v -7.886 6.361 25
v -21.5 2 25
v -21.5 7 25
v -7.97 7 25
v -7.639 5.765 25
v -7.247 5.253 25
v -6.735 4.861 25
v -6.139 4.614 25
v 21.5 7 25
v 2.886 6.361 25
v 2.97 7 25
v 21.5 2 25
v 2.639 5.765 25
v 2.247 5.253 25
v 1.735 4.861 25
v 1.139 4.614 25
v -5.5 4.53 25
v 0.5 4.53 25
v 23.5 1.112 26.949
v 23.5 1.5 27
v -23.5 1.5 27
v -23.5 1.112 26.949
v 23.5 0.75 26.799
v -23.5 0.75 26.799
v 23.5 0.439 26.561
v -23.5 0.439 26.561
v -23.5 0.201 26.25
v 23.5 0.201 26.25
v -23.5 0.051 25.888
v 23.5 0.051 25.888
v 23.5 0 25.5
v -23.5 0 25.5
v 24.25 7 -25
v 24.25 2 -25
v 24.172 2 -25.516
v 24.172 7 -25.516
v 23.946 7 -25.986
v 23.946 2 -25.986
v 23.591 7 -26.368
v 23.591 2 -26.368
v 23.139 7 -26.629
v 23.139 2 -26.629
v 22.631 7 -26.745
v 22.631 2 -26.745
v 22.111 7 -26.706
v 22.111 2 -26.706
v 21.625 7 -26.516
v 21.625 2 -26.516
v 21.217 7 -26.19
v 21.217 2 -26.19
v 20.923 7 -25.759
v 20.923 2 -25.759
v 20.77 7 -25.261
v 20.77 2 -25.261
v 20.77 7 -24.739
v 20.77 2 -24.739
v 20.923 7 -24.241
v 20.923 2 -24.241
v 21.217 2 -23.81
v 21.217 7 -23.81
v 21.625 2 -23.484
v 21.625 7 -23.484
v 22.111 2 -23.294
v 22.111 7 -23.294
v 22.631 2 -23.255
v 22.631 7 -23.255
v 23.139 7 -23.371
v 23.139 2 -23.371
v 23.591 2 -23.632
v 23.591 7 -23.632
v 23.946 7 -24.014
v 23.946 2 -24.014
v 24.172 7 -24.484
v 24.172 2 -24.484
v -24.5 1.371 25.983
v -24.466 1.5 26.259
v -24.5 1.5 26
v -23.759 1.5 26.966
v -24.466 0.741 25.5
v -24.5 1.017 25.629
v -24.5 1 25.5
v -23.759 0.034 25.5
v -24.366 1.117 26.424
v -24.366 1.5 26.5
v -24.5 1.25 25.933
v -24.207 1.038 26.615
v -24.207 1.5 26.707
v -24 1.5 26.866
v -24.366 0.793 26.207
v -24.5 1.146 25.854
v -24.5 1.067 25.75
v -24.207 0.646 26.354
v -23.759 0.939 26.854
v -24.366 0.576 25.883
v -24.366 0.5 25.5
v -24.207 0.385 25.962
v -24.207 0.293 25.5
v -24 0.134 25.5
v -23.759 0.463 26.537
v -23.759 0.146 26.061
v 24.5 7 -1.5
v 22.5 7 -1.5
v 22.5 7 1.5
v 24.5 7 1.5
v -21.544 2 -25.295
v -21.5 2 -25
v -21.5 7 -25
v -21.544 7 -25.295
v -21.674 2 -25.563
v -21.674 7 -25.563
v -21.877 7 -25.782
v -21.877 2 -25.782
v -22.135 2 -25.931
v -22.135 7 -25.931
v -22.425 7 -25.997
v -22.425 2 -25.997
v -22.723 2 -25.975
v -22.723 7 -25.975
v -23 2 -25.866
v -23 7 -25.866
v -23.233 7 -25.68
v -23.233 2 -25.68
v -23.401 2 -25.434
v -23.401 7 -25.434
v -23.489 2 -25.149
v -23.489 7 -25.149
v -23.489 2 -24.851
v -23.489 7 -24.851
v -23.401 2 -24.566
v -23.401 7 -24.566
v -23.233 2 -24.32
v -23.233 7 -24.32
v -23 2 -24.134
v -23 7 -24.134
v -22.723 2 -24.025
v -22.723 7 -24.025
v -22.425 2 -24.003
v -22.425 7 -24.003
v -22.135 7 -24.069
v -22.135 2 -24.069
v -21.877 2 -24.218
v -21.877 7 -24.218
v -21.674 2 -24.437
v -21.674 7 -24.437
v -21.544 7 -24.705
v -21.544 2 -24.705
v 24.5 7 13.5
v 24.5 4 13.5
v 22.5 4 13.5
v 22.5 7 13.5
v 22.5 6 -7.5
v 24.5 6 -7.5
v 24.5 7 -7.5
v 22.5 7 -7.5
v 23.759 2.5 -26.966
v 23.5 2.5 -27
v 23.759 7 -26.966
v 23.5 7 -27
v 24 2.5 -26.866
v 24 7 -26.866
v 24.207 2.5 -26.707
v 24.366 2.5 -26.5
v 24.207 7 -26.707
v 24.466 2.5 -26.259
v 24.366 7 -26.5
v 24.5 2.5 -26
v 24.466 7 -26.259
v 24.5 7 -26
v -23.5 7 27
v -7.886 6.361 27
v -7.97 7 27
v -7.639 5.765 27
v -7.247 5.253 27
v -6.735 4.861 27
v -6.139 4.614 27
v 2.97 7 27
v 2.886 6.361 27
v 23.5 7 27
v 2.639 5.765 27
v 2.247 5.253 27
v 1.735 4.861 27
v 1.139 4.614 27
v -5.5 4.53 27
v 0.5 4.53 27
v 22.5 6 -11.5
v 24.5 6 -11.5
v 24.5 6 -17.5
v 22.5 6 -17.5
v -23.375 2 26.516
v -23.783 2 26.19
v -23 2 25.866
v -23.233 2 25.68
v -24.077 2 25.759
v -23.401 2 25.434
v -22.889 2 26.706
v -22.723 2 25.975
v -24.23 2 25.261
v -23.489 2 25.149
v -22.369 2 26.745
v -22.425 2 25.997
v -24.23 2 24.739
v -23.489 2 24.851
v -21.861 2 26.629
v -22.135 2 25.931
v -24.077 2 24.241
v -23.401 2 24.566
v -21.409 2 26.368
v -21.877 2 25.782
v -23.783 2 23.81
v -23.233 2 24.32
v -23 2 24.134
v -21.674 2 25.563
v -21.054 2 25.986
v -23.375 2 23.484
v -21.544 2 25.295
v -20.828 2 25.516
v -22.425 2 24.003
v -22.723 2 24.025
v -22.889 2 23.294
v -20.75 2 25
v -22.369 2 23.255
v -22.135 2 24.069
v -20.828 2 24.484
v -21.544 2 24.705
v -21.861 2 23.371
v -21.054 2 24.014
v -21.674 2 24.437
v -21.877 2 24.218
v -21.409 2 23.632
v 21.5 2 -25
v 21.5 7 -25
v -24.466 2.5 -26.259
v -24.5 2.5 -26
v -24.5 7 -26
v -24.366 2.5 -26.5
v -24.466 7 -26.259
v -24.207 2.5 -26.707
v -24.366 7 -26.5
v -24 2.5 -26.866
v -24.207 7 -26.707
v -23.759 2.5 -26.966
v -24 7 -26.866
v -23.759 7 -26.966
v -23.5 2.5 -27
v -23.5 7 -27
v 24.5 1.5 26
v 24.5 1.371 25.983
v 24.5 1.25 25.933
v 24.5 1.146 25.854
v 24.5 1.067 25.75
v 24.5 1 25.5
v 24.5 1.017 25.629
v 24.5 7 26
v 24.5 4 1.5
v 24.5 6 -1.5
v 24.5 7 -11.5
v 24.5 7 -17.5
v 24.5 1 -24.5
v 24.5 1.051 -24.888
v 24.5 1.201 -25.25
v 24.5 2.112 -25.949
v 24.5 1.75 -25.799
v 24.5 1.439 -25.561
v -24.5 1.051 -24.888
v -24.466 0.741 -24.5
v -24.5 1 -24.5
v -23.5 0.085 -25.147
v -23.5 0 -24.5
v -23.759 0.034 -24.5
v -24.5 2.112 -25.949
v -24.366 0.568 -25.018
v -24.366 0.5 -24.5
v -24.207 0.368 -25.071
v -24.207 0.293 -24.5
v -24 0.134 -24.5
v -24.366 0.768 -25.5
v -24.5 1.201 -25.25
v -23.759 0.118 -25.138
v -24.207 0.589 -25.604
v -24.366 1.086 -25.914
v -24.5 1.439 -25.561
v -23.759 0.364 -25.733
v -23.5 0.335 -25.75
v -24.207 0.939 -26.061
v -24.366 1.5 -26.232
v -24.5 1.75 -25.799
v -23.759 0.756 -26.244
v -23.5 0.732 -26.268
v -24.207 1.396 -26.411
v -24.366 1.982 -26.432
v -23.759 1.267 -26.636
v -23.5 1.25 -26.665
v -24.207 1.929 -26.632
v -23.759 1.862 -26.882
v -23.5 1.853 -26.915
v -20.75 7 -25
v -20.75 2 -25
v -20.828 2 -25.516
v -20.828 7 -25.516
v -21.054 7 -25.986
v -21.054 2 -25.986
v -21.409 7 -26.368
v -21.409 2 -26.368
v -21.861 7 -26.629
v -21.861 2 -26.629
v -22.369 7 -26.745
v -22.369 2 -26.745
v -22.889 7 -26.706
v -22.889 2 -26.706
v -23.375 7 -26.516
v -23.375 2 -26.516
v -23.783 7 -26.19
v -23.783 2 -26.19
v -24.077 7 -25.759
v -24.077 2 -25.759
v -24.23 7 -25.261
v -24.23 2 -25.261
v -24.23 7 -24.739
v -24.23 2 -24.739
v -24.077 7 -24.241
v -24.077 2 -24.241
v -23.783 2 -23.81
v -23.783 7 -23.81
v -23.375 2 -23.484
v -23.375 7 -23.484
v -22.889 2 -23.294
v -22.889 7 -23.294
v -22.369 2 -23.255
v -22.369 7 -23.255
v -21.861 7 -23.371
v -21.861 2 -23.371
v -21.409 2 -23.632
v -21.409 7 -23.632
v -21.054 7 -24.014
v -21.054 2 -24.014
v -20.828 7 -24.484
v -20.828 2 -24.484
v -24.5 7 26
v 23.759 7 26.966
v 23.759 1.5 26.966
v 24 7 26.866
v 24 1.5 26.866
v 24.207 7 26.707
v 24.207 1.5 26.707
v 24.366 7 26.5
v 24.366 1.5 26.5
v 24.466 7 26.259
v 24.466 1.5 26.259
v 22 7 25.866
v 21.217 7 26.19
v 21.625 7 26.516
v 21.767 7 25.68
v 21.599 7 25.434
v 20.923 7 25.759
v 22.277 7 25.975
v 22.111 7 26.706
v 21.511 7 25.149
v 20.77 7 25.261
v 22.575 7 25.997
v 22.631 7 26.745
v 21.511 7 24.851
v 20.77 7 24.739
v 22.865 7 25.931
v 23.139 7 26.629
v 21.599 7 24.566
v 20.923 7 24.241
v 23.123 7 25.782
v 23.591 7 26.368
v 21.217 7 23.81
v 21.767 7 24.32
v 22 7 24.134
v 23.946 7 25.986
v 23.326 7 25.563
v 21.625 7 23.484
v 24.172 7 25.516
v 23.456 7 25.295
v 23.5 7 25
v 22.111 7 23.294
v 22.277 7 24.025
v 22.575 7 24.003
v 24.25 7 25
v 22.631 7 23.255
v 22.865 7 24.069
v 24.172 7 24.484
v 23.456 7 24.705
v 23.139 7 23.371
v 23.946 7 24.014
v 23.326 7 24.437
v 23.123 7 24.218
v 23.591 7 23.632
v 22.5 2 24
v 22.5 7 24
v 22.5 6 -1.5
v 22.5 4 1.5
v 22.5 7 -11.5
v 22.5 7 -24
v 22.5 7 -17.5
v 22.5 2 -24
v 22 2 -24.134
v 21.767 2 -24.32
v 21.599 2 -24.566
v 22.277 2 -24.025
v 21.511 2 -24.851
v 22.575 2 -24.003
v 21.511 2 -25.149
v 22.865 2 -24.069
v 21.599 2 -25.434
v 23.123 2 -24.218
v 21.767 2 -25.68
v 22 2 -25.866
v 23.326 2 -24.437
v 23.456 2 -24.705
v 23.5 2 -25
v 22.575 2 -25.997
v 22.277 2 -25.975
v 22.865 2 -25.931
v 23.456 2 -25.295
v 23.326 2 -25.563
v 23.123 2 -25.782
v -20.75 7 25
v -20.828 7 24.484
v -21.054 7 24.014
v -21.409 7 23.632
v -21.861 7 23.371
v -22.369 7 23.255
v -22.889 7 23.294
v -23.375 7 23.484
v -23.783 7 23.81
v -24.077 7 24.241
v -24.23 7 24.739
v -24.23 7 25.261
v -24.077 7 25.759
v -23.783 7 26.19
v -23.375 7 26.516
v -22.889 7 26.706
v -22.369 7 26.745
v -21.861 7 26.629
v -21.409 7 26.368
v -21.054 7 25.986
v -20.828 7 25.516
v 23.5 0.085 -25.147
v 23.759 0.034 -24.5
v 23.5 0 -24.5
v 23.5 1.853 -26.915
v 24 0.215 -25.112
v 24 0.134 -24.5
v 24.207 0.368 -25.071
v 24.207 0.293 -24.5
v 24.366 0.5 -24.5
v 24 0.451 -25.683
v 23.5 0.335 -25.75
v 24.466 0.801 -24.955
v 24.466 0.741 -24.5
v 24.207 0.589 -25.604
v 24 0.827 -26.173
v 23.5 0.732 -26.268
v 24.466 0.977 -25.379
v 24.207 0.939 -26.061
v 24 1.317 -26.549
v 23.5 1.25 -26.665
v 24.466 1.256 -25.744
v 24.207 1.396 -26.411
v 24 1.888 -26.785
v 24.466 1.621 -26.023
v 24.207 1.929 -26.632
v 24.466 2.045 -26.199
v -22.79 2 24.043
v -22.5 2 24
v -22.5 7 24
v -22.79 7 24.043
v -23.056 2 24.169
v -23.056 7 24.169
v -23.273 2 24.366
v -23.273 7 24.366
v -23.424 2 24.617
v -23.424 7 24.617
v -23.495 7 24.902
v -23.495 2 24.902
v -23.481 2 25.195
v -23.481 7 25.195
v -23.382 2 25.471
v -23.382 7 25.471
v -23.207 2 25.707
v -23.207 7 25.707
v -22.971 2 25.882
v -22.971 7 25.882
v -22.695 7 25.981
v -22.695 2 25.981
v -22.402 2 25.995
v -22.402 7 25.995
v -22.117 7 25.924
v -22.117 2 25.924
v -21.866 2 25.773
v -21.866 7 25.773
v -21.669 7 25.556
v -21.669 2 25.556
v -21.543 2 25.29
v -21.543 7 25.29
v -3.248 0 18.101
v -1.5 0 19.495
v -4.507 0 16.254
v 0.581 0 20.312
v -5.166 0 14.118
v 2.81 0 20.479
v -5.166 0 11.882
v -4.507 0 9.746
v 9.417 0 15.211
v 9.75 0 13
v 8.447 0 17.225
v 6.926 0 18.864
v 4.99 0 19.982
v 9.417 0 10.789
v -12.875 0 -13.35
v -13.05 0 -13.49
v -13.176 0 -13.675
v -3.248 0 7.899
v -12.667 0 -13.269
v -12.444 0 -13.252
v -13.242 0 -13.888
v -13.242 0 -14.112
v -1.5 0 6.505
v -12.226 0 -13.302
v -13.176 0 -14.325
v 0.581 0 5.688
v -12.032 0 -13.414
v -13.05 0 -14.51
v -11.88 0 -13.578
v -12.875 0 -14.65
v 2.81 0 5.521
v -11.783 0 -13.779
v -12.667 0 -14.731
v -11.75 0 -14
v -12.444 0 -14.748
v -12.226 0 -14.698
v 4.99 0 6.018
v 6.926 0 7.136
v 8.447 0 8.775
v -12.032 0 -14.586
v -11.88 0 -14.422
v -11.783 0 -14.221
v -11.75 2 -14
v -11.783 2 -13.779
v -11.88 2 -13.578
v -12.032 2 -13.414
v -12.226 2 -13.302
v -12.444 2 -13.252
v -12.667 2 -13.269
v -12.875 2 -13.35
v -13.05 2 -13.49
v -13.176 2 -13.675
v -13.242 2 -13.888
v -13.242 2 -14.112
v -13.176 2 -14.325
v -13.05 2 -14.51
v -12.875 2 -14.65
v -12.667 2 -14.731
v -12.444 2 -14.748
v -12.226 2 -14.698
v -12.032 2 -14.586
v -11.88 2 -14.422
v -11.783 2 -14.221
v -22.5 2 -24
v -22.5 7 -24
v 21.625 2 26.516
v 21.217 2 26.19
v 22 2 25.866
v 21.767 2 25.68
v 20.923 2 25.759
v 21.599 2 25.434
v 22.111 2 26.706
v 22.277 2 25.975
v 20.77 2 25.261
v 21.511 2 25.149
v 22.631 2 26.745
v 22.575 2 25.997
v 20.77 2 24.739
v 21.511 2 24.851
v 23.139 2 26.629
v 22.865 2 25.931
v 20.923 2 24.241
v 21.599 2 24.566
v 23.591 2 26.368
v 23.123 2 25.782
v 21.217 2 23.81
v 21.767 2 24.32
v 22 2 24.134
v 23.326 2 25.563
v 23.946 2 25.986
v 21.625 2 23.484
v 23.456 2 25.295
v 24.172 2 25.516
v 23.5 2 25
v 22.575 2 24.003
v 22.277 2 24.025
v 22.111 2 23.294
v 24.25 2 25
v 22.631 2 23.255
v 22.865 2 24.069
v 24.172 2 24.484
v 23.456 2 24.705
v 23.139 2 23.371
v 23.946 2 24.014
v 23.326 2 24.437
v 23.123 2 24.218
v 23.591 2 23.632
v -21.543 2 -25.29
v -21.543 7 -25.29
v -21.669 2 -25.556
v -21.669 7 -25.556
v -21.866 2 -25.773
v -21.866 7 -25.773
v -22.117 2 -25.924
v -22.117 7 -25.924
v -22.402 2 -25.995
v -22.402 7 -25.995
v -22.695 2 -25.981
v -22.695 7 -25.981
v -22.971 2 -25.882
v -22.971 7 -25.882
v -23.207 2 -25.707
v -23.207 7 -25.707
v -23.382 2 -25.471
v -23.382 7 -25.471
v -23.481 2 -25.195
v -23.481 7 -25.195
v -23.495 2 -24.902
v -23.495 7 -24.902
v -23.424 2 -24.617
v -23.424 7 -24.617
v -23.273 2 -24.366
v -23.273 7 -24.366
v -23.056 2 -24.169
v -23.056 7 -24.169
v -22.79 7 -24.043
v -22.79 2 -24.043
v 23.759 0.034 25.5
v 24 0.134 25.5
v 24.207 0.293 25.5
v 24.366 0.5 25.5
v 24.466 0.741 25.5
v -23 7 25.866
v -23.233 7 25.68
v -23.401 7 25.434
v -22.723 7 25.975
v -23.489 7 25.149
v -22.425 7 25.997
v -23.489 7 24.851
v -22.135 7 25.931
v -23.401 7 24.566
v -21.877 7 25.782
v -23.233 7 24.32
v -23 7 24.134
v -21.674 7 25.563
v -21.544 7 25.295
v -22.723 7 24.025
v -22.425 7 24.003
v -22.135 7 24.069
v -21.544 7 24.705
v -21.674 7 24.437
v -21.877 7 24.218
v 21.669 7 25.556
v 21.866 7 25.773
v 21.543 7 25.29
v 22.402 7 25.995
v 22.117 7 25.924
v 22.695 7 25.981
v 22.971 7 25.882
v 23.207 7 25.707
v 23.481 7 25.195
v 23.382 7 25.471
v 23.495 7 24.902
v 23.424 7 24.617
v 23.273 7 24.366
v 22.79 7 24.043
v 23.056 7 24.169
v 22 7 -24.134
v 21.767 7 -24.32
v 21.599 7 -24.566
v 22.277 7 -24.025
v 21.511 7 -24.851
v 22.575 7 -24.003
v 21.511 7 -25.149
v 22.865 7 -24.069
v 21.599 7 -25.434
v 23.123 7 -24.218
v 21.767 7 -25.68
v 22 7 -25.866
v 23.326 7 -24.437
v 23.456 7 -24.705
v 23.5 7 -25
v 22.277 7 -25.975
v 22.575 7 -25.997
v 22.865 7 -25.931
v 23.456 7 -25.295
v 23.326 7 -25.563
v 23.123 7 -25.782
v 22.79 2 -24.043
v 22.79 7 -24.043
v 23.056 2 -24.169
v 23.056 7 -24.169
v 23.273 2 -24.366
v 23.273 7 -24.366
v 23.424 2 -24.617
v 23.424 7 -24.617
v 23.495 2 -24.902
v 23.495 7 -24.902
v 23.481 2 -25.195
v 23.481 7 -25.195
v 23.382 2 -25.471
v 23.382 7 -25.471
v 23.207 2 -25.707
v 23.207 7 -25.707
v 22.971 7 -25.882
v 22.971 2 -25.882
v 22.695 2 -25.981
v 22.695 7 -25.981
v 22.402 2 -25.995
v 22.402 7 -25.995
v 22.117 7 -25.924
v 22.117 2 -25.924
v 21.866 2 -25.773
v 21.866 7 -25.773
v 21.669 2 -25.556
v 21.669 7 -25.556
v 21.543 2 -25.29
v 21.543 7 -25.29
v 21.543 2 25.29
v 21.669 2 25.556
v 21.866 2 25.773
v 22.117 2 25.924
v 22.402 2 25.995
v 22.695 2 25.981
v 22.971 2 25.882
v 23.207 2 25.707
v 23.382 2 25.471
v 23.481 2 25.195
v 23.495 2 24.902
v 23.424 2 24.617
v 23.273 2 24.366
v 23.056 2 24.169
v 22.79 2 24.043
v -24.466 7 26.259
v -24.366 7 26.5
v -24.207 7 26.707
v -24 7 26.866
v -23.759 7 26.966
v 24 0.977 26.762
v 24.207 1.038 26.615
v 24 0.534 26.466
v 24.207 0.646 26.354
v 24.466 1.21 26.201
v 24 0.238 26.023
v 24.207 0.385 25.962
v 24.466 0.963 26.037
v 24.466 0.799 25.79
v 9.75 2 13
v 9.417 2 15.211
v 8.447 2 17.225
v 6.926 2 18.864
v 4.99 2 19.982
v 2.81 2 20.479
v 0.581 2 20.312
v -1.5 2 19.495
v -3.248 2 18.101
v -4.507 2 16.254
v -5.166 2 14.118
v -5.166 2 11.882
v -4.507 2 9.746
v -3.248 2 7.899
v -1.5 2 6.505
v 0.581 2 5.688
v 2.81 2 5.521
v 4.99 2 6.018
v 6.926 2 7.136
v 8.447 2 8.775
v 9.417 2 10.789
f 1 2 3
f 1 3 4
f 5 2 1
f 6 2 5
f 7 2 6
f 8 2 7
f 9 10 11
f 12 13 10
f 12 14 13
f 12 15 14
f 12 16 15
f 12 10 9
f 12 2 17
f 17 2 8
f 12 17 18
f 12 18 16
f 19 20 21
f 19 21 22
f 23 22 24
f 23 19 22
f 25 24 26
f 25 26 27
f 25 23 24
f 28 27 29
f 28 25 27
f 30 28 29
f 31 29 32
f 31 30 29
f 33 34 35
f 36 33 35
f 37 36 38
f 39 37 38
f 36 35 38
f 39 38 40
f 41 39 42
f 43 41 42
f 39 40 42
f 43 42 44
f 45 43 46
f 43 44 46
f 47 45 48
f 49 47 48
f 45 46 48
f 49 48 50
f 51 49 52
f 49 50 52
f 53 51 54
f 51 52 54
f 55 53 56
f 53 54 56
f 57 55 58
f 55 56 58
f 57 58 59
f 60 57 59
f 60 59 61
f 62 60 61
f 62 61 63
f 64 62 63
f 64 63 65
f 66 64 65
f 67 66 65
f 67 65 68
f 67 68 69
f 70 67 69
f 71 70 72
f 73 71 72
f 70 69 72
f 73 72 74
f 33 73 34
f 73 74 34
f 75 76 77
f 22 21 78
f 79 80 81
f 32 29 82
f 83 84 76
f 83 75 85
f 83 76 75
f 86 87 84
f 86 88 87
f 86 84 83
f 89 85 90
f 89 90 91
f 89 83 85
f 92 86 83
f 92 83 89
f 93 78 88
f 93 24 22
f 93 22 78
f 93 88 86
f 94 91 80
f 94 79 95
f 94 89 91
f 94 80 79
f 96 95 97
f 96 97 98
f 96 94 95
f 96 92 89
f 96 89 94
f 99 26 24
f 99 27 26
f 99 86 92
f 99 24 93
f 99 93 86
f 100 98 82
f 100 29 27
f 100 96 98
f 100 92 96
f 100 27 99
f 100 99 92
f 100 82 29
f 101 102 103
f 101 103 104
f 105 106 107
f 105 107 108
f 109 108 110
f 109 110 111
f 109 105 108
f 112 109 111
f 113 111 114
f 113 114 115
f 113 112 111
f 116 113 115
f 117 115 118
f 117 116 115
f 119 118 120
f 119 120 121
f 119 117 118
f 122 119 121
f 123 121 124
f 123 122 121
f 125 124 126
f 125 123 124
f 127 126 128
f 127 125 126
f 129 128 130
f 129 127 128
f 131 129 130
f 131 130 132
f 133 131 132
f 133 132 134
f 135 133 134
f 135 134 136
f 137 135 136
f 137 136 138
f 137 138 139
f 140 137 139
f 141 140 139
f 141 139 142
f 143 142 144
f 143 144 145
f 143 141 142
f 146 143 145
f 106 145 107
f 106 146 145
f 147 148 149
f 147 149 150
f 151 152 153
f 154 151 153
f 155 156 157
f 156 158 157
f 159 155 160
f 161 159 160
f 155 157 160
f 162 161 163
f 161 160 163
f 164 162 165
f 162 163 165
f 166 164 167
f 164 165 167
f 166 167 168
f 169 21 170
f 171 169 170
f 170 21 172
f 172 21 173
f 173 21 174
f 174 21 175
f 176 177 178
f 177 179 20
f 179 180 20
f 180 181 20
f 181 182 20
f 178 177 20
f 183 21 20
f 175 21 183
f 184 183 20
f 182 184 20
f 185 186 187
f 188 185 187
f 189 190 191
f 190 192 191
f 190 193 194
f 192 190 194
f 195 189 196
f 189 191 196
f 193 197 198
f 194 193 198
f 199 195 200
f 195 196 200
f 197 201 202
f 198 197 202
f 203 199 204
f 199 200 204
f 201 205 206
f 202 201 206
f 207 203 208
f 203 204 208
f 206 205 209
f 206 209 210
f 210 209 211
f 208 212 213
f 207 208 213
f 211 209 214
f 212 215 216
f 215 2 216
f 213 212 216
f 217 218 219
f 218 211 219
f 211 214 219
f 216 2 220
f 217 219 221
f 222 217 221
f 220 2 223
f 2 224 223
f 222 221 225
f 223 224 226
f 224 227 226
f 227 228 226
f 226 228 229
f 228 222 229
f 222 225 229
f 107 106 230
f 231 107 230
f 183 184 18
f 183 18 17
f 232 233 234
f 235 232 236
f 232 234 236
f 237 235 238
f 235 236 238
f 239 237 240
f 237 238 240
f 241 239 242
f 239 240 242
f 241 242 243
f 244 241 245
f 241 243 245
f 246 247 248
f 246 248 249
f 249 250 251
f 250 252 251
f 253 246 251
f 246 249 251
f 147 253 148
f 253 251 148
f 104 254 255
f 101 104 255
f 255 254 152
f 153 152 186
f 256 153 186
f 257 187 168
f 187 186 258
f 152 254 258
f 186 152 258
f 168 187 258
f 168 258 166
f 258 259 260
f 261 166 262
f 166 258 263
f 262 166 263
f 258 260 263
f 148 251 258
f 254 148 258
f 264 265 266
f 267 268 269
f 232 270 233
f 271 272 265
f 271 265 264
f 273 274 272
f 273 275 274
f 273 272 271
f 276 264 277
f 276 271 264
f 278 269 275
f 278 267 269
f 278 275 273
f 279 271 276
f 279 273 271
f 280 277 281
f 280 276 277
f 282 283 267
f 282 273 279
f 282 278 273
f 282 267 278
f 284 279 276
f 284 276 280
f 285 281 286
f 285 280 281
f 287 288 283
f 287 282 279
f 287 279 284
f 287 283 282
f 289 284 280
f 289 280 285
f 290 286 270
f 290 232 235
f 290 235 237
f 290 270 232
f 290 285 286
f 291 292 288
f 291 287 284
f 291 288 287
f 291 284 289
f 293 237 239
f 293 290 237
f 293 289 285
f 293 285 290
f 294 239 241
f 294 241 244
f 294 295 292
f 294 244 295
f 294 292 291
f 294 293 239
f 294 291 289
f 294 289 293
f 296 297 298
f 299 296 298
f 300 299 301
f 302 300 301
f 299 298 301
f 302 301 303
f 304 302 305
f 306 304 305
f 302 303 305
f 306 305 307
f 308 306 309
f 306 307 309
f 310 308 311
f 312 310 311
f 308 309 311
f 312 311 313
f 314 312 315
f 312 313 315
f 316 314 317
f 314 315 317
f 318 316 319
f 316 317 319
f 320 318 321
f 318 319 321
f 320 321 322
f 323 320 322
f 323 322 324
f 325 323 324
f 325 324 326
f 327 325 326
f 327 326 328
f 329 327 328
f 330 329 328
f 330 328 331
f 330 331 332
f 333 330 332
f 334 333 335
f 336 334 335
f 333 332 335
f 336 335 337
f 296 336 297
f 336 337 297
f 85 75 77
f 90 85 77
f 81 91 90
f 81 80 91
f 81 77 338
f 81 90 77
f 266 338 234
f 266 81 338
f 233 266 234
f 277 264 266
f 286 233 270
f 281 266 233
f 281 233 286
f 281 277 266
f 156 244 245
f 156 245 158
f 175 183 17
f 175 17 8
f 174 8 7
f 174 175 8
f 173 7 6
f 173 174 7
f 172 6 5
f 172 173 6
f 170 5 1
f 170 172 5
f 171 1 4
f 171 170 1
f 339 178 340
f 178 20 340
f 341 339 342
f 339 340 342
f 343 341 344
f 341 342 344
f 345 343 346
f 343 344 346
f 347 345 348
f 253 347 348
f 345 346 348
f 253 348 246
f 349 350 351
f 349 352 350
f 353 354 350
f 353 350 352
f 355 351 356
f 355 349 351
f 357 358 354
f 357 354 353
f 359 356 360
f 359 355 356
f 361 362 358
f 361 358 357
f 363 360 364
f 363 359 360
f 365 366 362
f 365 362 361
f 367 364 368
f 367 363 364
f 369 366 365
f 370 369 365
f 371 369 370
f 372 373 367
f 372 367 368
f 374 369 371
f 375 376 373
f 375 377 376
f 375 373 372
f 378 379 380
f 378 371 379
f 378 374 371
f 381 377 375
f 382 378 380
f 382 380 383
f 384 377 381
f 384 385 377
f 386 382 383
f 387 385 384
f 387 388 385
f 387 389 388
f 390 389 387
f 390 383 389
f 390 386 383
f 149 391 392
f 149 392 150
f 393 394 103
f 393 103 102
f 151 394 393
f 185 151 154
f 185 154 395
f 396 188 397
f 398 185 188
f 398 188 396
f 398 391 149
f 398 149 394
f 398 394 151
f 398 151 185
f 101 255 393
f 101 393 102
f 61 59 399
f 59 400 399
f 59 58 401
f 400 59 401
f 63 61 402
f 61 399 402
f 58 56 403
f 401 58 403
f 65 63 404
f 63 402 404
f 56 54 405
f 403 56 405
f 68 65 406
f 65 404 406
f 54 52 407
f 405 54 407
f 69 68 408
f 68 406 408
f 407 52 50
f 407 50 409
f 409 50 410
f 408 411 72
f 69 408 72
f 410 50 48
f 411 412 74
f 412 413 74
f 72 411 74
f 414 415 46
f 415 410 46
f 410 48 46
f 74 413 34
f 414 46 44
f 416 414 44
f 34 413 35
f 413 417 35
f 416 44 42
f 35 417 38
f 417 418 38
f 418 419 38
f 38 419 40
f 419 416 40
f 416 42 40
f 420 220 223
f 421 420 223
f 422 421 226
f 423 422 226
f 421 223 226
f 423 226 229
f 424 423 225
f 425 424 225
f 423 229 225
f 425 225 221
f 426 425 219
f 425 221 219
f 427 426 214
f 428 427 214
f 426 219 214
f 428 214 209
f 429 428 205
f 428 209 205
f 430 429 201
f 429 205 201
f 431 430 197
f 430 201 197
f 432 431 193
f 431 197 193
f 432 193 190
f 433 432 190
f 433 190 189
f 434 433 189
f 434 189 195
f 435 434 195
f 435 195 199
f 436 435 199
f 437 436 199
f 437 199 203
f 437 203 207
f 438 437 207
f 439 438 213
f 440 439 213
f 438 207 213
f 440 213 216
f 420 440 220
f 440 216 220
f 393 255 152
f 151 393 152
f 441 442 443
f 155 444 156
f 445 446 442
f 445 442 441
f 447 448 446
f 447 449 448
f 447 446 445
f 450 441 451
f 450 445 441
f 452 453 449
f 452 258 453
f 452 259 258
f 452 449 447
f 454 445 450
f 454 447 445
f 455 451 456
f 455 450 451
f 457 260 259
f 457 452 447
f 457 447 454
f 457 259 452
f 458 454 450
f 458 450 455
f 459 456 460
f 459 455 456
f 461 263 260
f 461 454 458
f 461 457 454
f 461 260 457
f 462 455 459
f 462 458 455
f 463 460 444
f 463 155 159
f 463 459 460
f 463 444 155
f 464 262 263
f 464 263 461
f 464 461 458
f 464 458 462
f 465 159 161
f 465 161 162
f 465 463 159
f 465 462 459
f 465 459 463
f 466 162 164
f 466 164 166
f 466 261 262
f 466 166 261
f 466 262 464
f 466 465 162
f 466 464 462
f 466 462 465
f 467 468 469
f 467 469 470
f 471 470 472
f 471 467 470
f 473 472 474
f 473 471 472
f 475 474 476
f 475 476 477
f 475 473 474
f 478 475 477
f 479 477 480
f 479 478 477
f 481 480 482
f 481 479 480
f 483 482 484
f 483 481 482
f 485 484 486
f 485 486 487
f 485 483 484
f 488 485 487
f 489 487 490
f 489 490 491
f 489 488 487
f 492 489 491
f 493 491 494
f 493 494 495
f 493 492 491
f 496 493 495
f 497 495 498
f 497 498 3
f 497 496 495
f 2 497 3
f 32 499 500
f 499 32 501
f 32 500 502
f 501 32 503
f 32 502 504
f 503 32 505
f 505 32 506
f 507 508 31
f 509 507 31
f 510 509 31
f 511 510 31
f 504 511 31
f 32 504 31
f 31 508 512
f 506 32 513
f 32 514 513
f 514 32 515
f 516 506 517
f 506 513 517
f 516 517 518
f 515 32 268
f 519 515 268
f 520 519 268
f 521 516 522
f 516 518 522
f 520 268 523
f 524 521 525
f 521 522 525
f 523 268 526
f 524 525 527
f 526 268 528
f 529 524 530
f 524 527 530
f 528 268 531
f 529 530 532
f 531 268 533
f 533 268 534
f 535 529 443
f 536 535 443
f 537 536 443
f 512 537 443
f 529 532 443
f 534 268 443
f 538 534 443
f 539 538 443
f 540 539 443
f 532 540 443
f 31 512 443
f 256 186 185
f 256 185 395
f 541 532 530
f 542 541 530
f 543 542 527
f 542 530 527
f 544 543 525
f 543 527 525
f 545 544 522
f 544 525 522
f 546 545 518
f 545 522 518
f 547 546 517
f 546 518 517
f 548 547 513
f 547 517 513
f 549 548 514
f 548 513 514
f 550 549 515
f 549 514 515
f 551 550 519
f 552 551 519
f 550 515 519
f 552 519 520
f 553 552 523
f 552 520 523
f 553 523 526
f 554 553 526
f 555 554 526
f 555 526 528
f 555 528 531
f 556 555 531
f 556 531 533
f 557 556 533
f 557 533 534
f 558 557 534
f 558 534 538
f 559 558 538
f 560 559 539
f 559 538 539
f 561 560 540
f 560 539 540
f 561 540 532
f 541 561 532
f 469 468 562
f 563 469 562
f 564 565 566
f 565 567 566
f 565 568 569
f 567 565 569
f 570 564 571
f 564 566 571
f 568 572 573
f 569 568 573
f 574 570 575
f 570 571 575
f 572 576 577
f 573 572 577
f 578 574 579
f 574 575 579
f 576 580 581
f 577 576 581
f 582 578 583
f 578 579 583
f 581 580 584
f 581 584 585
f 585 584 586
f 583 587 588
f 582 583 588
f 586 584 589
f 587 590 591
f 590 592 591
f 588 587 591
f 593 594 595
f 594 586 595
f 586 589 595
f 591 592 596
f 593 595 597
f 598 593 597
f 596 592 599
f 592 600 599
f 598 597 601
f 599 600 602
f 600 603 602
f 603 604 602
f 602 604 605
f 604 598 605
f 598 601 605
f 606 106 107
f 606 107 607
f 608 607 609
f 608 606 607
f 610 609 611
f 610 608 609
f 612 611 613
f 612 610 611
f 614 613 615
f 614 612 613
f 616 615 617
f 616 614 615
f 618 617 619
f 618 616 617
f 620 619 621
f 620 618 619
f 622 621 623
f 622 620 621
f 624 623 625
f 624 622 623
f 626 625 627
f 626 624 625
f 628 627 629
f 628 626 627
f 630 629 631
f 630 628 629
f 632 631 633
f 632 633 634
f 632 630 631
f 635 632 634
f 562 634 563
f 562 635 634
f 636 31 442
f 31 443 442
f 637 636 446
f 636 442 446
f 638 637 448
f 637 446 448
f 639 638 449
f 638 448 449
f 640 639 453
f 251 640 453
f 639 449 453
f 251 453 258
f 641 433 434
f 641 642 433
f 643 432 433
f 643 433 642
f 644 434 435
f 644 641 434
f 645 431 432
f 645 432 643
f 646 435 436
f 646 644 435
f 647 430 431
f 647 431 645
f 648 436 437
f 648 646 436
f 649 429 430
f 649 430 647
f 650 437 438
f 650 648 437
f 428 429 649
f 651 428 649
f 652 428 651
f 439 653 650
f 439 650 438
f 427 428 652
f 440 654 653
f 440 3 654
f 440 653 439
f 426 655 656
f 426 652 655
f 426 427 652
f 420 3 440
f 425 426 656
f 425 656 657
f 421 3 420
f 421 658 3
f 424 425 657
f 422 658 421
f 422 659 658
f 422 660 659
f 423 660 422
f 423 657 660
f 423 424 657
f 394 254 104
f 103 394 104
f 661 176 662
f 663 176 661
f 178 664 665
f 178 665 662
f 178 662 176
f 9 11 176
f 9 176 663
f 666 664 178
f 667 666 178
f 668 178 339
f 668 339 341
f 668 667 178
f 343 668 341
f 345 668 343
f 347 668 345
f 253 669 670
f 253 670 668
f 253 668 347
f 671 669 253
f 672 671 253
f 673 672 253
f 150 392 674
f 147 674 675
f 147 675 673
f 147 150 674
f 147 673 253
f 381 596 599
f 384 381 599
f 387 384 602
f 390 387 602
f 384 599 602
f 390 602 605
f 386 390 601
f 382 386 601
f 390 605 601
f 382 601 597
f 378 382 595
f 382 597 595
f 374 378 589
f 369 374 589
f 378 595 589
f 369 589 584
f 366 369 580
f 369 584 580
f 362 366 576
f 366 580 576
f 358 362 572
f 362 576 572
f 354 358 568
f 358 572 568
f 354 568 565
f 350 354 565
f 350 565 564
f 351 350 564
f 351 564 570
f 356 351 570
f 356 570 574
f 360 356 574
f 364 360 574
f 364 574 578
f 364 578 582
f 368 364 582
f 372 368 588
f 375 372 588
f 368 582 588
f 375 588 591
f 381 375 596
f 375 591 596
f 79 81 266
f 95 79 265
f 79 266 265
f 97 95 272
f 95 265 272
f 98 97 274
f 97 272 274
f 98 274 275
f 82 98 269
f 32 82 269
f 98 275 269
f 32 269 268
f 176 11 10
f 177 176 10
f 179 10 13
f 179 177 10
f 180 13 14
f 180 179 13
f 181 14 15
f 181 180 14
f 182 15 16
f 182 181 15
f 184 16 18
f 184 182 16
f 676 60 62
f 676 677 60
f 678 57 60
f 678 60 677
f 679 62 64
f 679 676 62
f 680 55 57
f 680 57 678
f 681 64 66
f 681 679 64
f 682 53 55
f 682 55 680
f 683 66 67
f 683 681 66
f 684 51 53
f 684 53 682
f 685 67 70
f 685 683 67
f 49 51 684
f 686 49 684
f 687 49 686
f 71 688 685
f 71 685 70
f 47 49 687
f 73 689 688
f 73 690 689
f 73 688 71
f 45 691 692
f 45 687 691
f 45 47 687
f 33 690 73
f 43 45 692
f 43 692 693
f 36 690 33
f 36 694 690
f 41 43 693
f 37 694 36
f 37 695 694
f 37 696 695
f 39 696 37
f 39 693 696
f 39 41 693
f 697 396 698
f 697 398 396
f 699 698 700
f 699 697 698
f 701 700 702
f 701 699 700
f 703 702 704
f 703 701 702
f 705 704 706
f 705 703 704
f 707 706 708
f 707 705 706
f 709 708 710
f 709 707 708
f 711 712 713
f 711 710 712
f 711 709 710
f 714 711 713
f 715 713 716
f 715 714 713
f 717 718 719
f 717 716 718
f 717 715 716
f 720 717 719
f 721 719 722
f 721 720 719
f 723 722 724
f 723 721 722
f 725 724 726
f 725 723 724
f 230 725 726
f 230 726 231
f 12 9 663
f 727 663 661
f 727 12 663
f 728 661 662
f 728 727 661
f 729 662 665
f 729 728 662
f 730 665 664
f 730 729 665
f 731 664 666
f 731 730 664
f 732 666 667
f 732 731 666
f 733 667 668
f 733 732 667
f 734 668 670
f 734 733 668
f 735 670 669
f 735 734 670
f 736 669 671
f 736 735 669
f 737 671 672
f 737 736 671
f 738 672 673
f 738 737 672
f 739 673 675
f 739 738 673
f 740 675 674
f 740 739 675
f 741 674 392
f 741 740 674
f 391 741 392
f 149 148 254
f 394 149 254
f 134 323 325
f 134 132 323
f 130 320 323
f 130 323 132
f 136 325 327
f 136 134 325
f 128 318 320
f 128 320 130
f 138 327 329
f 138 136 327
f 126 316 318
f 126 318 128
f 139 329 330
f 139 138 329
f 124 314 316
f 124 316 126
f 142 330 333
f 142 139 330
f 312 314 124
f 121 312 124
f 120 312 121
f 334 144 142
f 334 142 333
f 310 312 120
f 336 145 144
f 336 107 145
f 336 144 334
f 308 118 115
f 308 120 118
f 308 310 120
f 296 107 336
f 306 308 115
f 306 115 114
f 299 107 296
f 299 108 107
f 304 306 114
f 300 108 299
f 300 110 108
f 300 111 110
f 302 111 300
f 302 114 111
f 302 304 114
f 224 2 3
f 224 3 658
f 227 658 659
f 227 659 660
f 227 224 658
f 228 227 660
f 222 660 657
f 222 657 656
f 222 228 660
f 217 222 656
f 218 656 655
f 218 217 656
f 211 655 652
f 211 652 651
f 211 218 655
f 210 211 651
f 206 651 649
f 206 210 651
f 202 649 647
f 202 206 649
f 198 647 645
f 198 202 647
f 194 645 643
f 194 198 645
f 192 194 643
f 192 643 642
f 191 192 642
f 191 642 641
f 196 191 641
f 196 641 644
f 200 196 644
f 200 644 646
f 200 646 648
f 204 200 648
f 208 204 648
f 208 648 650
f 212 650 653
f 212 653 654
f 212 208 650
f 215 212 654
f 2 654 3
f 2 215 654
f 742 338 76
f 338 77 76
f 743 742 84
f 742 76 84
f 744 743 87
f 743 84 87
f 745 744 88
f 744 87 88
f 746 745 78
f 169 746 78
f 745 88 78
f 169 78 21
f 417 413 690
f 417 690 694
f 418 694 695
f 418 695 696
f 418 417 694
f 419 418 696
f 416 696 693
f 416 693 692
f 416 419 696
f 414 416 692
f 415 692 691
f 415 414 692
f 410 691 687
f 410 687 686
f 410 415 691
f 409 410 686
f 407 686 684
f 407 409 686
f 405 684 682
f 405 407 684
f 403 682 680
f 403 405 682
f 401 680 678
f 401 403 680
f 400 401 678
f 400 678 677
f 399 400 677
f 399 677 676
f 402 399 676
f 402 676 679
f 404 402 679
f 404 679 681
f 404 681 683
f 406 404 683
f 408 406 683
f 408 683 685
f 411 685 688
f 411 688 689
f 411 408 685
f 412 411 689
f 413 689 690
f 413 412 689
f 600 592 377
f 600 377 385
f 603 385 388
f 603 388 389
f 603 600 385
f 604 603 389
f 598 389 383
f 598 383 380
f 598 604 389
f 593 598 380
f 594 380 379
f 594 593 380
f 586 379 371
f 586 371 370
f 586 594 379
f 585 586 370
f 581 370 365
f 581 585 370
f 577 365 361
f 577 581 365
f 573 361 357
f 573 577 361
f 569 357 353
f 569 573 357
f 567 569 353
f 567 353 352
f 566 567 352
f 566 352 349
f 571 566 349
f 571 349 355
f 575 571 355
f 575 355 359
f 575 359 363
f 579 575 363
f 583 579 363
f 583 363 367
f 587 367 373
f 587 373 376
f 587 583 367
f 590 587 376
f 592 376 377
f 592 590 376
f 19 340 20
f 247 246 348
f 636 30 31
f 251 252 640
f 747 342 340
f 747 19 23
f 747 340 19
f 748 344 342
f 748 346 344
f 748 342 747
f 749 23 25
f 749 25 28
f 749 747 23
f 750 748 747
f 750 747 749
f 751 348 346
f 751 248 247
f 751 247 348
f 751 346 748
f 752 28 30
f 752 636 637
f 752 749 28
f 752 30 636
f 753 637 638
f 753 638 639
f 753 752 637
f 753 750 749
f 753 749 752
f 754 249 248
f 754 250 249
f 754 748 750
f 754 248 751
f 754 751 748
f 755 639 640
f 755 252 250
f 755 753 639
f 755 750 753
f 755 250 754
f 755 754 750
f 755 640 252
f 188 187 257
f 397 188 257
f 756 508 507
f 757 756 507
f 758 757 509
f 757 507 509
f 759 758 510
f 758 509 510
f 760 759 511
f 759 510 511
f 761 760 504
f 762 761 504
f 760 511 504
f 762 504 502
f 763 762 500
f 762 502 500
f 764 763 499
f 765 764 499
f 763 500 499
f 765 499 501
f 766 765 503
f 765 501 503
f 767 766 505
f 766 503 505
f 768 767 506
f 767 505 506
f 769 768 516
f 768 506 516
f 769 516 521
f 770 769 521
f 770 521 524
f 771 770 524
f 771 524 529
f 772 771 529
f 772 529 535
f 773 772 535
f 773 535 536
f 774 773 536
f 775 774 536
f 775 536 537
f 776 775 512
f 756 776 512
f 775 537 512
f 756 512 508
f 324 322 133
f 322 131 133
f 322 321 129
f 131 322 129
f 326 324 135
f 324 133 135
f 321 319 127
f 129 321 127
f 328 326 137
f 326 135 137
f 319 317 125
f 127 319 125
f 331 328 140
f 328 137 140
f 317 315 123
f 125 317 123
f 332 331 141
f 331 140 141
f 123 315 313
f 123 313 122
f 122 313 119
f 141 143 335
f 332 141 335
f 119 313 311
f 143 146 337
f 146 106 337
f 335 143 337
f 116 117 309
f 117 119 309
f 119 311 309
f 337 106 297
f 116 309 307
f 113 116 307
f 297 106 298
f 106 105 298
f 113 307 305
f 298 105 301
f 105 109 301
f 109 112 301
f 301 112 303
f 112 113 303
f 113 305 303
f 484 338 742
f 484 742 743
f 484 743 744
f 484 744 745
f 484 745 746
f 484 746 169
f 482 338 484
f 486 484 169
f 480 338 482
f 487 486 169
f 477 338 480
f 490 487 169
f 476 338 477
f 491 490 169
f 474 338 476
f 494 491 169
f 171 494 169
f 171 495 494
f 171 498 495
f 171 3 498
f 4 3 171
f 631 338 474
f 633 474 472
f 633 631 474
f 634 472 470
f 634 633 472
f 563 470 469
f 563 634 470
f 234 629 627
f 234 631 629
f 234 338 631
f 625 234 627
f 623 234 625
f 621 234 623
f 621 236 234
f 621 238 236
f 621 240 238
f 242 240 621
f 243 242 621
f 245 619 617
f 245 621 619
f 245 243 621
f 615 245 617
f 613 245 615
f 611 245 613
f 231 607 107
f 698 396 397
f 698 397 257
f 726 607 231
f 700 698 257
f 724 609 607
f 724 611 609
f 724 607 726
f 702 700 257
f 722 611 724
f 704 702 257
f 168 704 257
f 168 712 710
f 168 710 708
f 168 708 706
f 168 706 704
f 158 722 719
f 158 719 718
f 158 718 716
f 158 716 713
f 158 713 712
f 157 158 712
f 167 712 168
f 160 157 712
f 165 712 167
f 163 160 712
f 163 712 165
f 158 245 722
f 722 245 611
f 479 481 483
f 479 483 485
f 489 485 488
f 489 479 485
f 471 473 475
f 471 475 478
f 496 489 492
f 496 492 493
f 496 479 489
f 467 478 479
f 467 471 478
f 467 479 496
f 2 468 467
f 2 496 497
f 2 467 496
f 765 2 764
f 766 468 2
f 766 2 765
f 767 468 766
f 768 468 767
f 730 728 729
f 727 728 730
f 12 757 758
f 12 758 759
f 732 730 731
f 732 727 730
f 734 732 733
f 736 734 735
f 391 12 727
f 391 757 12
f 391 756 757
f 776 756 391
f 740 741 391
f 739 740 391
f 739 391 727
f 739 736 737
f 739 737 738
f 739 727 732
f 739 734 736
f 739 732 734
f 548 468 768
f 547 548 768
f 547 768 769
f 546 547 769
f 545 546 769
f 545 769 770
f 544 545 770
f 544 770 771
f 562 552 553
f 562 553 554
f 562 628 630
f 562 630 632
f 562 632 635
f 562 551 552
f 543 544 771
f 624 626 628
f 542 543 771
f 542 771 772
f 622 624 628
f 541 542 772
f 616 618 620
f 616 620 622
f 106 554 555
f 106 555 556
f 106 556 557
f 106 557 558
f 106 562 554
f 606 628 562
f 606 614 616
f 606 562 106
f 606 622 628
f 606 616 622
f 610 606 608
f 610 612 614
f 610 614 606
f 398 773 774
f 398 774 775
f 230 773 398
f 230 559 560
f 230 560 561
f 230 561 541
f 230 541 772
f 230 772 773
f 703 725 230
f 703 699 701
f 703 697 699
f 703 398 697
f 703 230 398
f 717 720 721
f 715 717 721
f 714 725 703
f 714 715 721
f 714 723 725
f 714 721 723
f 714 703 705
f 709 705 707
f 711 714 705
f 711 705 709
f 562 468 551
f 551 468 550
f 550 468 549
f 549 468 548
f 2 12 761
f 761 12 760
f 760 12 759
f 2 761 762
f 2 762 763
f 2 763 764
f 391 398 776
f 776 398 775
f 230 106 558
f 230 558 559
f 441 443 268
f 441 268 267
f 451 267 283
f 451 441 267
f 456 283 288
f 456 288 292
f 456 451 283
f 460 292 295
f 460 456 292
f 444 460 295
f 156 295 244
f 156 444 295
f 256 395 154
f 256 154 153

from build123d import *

# Parameters (mm, degrees)
SKETCH1_W             = 49
SKETCH1_H             = 54
BOSS_EXTRUDE1_DEPTH   = 2
SKETCH2_W             = 49
SKETCH2_H             = 54
SKETCH2_W_2           = 45
SKETCH2_H_2           = 50
EXTRUDE_THIN1_DEPTH   = 5
SKETCH3_W             = 12
SKETCH3_H             = 3
CUT_EXTRUDE4_DEPTH    = 2
SKETCH10_W            = 6
SKETCH10_H            = 1
CUT_EXTRUDE5_DEPTH    = 2
SKETCH11_W            = 6
SKETCH11_H            = 1
CUT_EXTRUDE6_DEPTH    = 2
SKETCH16_R            = 7.5
CUT_EXTRUDE7_DEPTH    = 2
CUT_EXTRUDE8_DEPTH    = 2
SKETCH24_R            = 0.75
CUT_EXTRUDE9_DEPTH    = 2
SKETCH26_R            = 1.75
BOSS_EXTRUDE2_DEPTH   = 5
BOSS_EXTRUDE2_2_DEPTH = 5
BOSS_EXTRUDE2_3_DEPTH = 5
BOSS_EXTRUDE2_4_DEPTH = 5
SKETCH27_R            = 1
CUT_EXTRUDE10_DEPTH   = 5
FILLET3_R             = 1.5
FILLET4_R             = 2.5
FILLET5_R             = 1


with BuildPart() as part:
    # Sketch1 → Boss-Extrude1 (new body)
    with BuildSketch(Plane(origin=(0, 0, 0), x_dir=(1, 0, 0), z_dir=(0, 1, 0))):
        Rectangle(SKETCH1_W, SKETCH1_H)
    extrude(amount=BOSS_EXTRUDE1_DEPTH)

    # Sketch2 → Extrude-Thin1 (add)
    with BuildSketch(Plane(origin=(0, 2, 0), x_dir=(1, 0, 0), z_dir=(0, 1, 0))):
        Rectangle(SKETCH2_W, SKETCH2_H)
        Rectangle(SKETCH2_W_2, SKETCH2_H_2, mode=Mode.SUBTRACT)
    extrude(amount=EXTRUDE_THIN1_DEPTH)

    # Sketch3 → Cut-Extrude4 (cut)
    with BuildSketch(Plane(origin=(24.5, 0, 0), x_dir=(0, 0, -1), z_dir=(1, 0, 0))):
        with Locations((-7.5, 5.5)):
            Rectangle(SKETCH3_W, SKETCH3_H)
    extrude(amount=-CUT_EXTRUDE4_DEPTH, mode=Mode.SUBTRACT)

    # Sketch10 → Cut-Extrude5 (cut)
    with BuildSketch(Plane(origin=(24.5, 0, 0), x_dir=(0, 0, -1), z_dir=(1, 0, 0))):
        with Locations((4.5, 6.5)):
            Rectangle(SKETCH10_W, SKETCH10_H)
    extrude(amount=-CUT_EXTRUDE5_DEPTH, mode=Mode.SUBTRACT)

    # Sketch11 → Cut-Extrude6 (cut)
    with BuildSketch(Plane(origin=(24.5, 0, 0), x_dir=(0, 0, -1), z_dir=(1, 0, 0))):
        with Locations((14.5, 6.5)):
            Rectangle(SKETCH11_W, SKETCH11_H)
    extrude(amount=-CUT_EXTRUDE6_DEPTH, mode=Mode.SUBTRACT)

    # Sketch16 → Cut-Extrude7 (cut)
    with BuildSketch(Plane.XZ):
        with Locations((2.25, 13)):
            Circle(SKETCH16_R)
    extrude(amount=-CUT_EXTRUDE7_DEPTH, mode=Mode.SUBTRACT)

    # Sketch22 → Cut-Extrude8 (cut)
    with BuildSketch(Plane.XY.offset(27)):
        with BuildLine():
            Line((0.5, 4.529666561), (-5.5, 4.529666561))
            ThreePointArc((-5.5, 4.529666561), (-7.970333439, 7), (-5.5, 9.470333439))
            Line((-5.5, 9.470333439), (0.5, 9.470333439))
            ThreePointArc((0.5, 9.470333439), (2.970333439, 7), (0.5, 4.529666561))
        make_face()
    extrude(amount=-CUT_EXTRUDE8_DEPTH, mode=Mode.SUBTRACT)

    # Sketch24 → Cut-Extrude9 (cut)
    with BuildSketch(Plane.XZ):
        with Locations((-12.5, -14)):
            Circle(SKETCH24_R)
    extrude(amount=-CUT_EXTRUDE9_DEPTH, mode=Mode.SUBTRACT)


with BuildPart() as body_2:
    # Sketch26 → Boss-Extrude2 (new body)
    with BuildSketch(Plane(origin=(0, 2, 0), x_dir=(1, 0, 0), z_dir=(0, 1, 0))):
        with Locations((-22.5, 25)):
            Circle(SKETCH26_R)
    extrude(amount=BOSS_EXTRUDE2_DEPTH)


with BuildPart() as body_3:
    # Sketch26 → Boss-Extrude2 2 (new body)
    with BuildSketch(Plane(origin=(0, 2, 0), x_dir=(1, 0, 0), z_dir=(0, 1, 0))):
        with Locations((22.5, 25)):
            Circle(SKETCH26_R)
    extrude(amount=BOSS_EXTRUDE2_2_DEPTH)


with BuildPart() as body_4:
    # Sketch26 → Boss-Extrude2 3 (new body)
    with BuildSketch(Plane(origin=(0, 2, 0), x_dir=(1, 0, 0), z_dir=(0, 1, 0))):
        with Locations((22.5, -25)):
            Circle(SKETCH26_R)
    extrude(amount=BOSS_EXTRUDE2_3_DEPTH)


with BuildPart() as body_5:
    # Sketch26 → Boss-Extrude2 4 (new body)
    with BuildSketch(Plane(origin=(0, 2, 0), x_dir=(1, 0, 0), z_dir=(0, 1, 0))):
        with Locations((-22.5, -25)):
            Circle(SKETCH26_R)
    extrude(amount=BOSS_EXTRUDE2_4_DEPTH)


with BuildPart() as cut_extrude10_tool:
    # Sketch27 → Cut-Extrude10 (new body)
    with BuildSketch(Plane(origin=(0, 2, 0), x_dir=(1, 0, 0), z_dir=(0, 1, 0))):
        with Locations((-22.5, 25)):
            Circle(SKETCH27_R)
        with Locations((22.5, 25)):
            Circle(SKETCH27_R)
        with Locations((22.5, -25)):
            Circle(SKETCH27_R)
        with Locations((-22.5, -25)):
            Circle(SKETCH27_R)
    extrude(amount=CUT_EXTRUDE10_DEPTH)


with BuildPart() as part_1:
    add(part.part)

    # Cut-Extrude10: cut by cut_extrude10_tool
    add(cut_extrude10_tool.part, mode=Mode.SUBTRACT)

    # Fillet3
    fillet3_edges = [part_1.edges().sort_by_distance(p)[0] for p in [
        (0, 0, 27),
    ]]
    fillet(fillet3_edges, radius=FILLET3_R)

    # Fillet4
    fillet4_edges = [part_1.edges().sort_by_distance(p)[0] for p in [
        (0, 0, -27),
    ]]
    fillet(fillet4_edges, radius=FILLET4_R)

    # Fillet5
    fillet5_edges = [part_1.edges().sort_by_distance(p)[0] for p in [
        (24.5, 0, 0.5),
        (24.5, 0.439339828, 26.560660172),
        (-24.5, 0.439339828, 26.560660172),
        (-24.5, 0, 0.5),
        (-24.5, 0.732233047, -26.267766953),
        (24.5, 0.732233047, -26.267766953),
        (-24.5, 4.75, -27),
        (24.5, 4.75, -27),
        (24.5, 4.25, 27),
        (-24.5, 4.25, 27),
    ]]
    fillet(fillet5_edges, radius=FILLET5_R)


with BuildPart() as body_2_1:
    add(body_2.part)

    # Cut-Extrude10: cut by cut_extrude10_tool
    add(cut_extrude10_tool.part, mode=Mode.SUBTRACT)


with BuildPart() as body_3_1:
    add(body_3.part)

    # Cut-Extrude10: cut by cut_extrude10_tool
    add(cut_extrude10_tool.part, mode=Mode.SUBTRACT)


with BuildPart() as body_4_1:
    add(body_4.part)

    # Cut-Extrude10: cut by cut_extrude10_tool
    add(cut_extrude10_tool.part, mode=Mode.SUBTRACT)


with BuildPart() as body_5_1:
    add(body_5.part)

    # Cut-Extrude10: cut by cut_extrude10_tool
    add(cut_extrude10_tool.part, mode=Mode.SUBTRACT)


solid = Compound([part_1.part, body_2_1.part, body_3_1.part, body_4_1.part, body_5_1.part])
